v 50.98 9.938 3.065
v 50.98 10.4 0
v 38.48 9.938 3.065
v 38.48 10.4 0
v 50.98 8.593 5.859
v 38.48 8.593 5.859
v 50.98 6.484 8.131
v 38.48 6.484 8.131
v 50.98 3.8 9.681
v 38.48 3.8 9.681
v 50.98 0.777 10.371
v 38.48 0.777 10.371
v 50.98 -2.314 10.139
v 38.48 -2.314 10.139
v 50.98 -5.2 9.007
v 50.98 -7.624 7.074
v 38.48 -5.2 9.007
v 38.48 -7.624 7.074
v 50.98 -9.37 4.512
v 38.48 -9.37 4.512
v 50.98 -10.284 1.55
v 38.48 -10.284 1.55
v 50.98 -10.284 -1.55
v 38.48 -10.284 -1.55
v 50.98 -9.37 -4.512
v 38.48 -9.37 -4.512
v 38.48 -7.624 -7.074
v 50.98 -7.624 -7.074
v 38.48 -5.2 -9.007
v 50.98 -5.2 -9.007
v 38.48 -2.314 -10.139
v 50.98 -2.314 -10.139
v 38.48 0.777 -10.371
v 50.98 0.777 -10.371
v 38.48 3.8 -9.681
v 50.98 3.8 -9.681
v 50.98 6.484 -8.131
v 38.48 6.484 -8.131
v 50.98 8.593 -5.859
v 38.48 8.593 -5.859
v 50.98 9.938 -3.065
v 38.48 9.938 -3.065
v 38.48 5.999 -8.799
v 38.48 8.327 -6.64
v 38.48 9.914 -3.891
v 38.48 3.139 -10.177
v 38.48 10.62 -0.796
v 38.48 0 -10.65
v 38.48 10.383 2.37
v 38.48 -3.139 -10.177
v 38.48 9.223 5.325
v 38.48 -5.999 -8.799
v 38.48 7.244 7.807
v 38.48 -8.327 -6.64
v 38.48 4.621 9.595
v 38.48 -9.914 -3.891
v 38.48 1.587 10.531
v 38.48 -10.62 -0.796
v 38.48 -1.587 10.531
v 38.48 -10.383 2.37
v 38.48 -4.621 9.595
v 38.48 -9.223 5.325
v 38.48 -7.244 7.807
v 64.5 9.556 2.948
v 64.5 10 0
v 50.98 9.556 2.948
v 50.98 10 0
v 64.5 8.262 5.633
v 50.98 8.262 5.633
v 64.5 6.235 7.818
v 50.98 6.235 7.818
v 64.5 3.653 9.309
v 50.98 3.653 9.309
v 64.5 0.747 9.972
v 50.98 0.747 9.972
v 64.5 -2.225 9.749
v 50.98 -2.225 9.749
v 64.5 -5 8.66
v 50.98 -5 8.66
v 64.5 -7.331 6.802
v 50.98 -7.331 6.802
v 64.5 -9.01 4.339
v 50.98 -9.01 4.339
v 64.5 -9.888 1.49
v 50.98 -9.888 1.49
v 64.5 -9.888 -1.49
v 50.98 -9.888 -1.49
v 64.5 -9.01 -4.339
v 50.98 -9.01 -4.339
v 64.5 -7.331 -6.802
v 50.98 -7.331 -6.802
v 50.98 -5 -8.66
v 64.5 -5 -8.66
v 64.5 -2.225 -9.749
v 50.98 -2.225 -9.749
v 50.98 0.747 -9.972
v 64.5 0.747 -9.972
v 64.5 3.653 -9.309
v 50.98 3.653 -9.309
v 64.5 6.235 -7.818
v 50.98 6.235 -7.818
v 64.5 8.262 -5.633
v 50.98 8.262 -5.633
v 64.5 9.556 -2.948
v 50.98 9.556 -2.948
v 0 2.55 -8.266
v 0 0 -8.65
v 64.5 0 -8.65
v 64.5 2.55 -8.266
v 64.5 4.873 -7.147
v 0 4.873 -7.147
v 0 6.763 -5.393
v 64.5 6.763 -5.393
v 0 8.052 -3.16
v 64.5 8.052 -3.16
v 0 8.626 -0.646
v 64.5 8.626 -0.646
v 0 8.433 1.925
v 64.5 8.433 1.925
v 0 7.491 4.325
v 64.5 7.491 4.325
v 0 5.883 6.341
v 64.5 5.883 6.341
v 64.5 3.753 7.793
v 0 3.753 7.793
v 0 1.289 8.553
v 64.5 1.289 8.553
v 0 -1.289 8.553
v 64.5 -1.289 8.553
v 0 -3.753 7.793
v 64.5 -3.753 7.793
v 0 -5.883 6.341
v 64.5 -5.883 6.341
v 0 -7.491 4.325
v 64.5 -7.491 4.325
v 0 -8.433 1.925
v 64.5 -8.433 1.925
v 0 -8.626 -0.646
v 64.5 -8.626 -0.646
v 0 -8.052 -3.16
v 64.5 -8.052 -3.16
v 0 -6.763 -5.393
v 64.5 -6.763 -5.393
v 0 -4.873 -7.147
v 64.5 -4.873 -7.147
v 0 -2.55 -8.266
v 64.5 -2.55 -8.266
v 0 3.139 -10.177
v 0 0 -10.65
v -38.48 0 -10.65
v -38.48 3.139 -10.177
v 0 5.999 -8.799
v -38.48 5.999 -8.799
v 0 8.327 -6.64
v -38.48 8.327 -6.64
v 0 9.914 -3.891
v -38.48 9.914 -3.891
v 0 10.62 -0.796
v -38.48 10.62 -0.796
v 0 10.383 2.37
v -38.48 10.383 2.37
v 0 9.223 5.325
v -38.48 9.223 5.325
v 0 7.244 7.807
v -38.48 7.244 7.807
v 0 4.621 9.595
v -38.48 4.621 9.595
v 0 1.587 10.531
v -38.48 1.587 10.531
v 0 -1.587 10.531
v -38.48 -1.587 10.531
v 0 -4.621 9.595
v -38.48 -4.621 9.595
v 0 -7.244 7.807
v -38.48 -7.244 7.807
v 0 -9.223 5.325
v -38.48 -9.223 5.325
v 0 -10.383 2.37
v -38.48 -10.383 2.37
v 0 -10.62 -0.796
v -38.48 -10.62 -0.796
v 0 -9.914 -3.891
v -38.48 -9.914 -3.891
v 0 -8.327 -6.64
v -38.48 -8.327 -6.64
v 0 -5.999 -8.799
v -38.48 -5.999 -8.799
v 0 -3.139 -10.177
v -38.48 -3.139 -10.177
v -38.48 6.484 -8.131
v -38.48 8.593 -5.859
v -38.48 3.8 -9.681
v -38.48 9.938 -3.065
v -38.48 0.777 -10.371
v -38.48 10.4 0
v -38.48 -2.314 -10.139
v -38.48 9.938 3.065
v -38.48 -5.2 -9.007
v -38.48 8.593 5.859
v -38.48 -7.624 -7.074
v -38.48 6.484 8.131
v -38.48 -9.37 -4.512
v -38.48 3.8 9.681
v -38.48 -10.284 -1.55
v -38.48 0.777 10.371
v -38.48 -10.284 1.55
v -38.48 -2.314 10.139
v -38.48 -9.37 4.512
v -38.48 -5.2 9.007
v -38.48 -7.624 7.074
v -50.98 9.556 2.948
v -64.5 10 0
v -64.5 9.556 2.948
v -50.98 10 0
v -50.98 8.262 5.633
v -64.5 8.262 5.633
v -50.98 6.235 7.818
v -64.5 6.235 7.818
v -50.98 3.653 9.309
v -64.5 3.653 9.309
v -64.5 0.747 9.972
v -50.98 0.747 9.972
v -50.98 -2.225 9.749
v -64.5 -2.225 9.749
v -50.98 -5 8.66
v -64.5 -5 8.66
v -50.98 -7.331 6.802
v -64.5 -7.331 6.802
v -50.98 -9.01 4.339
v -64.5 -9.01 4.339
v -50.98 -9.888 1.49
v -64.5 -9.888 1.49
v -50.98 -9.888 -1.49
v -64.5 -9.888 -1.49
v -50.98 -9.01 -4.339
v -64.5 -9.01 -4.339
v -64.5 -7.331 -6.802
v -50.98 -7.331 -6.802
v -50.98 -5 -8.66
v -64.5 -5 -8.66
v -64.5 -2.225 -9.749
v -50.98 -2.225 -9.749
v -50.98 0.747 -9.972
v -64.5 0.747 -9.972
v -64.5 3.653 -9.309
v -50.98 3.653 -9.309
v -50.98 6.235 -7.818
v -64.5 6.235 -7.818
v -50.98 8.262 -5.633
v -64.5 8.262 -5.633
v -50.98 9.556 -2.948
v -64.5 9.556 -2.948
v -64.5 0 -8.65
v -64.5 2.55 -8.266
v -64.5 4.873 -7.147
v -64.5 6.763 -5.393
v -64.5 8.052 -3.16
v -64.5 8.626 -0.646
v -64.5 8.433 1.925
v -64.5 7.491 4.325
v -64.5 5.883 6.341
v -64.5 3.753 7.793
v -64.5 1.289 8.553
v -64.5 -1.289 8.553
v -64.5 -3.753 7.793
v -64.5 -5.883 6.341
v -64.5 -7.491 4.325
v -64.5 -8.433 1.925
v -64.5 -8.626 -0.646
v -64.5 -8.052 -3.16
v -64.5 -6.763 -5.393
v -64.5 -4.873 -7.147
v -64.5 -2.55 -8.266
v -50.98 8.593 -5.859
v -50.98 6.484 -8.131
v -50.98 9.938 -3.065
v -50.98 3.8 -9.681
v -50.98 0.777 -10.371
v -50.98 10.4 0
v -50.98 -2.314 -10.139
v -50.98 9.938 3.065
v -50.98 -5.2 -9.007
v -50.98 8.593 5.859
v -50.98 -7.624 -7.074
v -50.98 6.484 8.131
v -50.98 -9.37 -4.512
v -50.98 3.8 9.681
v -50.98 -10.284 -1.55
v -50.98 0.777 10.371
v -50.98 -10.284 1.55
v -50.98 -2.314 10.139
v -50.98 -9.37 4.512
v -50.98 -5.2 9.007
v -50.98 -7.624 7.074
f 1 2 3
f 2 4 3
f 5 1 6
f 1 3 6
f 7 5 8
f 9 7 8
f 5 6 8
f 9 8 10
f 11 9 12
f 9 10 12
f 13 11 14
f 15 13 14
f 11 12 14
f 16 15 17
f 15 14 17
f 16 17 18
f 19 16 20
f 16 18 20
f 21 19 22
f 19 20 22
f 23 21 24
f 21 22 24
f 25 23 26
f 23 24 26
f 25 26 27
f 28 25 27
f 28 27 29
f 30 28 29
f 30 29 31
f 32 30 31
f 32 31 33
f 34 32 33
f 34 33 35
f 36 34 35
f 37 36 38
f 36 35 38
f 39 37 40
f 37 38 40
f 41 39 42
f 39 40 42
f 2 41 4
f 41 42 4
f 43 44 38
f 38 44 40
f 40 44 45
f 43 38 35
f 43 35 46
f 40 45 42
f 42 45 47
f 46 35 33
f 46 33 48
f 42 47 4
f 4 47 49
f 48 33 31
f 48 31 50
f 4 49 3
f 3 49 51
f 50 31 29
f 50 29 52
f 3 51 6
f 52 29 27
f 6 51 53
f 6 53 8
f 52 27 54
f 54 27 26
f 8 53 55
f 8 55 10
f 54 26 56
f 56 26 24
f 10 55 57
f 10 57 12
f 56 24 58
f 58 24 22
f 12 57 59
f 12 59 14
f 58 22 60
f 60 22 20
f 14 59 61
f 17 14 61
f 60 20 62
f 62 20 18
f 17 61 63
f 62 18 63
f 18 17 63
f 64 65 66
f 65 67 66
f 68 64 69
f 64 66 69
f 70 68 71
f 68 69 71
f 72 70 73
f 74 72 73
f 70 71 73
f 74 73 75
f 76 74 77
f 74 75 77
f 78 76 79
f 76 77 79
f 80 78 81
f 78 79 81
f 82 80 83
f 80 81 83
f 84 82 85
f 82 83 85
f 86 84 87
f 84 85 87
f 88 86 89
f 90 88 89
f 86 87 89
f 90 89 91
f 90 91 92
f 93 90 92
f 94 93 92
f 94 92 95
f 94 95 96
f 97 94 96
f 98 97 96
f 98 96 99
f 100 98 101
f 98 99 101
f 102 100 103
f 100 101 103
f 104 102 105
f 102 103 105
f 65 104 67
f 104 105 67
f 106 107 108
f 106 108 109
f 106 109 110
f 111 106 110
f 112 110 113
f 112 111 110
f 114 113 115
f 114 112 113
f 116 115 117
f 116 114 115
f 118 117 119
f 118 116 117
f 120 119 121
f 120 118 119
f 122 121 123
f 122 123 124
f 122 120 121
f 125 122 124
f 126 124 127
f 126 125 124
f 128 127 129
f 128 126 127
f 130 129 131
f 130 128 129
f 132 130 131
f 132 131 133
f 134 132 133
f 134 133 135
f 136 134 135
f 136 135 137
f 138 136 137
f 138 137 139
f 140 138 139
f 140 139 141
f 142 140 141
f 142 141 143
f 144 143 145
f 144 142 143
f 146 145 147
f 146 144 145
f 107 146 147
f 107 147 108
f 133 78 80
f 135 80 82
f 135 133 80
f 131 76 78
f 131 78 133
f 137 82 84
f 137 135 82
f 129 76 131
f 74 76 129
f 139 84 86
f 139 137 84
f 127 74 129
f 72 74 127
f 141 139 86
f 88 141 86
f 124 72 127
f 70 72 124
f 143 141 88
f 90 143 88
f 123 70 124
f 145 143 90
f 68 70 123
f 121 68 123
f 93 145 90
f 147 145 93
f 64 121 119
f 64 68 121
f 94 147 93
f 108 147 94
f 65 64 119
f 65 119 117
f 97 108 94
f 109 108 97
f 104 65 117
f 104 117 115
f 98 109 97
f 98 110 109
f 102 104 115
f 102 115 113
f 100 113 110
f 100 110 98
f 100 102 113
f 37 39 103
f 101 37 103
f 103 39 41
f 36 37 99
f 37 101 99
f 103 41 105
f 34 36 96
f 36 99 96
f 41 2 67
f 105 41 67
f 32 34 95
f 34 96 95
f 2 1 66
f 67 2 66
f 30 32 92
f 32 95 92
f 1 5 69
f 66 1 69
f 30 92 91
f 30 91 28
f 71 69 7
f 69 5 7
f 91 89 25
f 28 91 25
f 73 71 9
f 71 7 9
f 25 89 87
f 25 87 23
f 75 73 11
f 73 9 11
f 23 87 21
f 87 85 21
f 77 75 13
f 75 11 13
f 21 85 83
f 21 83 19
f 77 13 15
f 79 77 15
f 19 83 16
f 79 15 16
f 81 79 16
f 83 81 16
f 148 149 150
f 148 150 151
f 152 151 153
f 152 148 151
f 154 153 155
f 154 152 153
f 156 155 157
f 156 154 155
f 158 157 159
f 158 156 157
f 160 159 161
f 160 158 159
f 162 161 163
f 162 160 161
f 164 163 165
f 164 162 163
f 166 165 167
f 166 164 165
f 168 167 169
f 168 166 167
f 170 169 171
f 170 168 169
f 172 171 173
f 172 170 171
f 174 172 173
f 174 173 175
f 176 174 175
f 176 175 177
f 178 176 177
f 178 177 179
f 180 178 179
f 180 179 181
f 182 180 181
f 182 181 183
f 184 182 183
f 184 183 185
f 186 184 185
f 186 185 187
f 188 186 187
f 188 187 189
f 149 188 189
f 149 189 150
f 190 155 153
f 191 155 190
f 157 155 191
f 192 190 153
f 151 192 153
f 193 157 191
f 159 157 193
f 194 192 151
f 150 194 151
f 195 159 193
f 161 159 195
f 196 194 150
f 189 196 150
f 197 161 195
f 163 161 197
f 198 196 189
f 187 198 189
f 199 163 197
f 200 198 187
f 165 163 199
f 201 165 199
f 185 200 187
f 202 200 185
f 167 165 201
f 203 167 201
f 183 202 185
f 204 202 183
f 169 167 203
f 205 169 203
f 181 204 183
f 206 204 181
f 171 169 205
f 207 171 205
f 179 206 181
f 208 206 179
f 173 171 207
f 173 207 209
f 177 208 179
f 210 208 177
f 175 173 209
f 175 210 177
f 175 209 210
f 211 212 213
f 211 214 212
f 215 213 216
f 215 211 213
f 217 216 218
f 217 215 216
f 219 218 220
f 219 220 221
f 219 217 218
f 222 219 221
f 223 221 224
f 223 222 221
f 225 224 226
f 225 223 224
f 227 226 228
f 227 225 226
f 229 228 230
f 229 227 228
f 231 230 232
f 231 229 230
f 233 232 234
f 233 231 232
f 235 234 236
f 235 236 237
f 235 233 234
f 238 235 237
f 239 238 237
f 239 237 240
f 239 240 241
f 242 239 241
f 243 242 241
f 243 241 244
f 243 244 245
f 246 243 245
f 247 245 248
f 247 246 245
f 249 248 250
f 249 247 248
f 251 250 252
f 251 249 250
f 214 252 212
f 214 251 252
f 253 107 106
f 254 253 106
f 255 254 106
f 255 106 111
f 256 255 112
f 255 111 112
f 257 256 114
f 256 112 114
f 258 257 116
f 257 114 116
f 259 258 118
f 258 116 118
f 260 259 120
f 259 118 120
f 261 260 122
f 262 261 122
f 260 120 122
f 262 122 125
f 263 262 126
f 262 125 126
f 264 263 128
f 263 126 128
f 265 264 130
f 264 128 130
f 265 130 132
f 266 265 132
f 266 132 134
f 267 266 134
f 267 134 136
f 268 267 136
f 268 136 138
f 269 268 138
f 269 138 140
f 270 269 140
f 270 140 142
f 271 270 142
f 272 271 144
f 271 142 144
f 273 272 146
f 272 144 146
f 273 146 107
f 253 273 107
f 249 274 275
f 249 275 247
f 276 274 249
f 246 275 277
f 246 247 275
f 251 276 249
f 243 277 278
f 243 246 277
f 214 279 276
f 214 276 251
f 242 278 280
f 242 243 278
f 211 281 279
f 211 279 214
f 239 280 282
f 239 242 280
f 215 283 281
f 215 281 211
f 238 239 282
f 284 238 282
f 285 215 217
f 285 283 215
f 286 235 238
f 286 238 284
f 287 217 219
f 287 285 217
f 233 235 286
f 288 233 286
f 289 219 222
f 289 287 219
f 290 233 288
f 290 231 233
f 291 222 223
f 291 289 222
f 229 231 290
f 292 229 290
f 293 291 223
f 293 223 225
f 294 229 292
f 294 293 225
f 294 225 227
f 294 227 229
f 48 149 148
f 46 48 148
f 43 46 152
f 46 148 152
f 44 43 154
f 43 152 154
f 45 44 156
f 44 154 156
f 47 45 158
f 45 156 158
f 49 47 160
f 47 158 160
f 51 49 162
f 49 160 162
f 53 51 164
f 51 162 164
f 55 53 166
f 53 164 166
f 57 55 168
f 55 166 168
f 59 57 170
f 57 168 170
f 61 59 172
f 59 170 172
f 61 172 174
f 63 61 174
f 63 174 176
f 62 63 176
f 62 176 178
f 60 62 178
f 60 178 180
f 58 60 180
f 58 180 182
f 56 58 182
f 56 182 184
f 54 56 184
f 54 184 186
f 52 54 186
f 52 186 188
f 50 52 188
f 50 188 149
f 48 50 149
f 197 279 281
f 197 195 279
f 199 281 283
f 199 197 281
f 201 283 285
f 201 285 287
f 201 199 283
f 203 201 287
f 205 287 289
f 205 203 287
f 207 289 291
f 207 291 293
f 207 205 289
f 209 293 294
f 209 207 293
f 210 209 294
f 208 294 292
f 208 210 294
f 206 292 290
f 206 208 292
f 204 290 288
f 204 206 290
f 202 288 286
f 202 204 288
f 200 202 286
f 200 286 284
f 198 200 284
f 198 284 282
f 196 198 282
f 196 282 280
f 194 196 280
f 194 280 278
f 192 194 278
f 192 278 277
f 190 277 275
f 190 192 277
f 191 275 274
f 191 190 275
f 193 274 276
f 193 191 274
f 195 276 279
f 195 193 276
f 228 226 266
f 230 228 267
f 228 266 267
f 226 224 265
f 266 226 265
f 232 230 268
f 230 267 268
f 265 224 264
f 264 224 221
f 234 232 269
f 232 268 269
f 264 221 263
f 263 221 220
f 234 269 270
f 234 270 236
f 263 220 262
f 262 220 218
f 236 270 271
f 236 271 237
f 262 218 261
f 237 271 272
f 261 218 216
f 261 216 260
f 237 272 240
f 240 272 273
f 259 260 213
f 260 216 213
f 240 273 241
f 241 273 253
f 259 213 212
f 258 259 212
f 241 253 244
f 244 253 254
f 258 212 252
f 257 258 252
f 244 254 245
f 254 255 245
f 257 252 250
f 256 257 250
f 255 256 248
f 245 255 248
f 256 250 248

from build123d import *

# Parameters (mm, degrees)
SKETCH_1_R      = 10.65
SKETCH_1_R_2    = 8.65
EXTRUDE_1_DEPTH = 64.5


with BuildPart() as part:
    # Эскиз1 → Бобышка-Вытянуть1 (new body)
    with BuildSketch(Plane(origin=(0, 0, 0), x_dir=(0, 0, -1), z_dir=(1, 0, 0))):
        Circle(SKETCH_1_R)
        Circle(SKETCH_1_R_2, mode=Mode.SUBTRACT)
    extrude(amount=-EXTRUDE_1_DEPTH)

    # Эскиз2 → Вырез-Повернуть1 (revolve, cut)
    with BuildSketch(Plane.XY):
        Polygon((-38.480196097, 10.65), (-64.5, 10.65), (-64.5, 10), (-50.980196097, 10), (-50.980196097, 10.4), (-38.480196097, 10.4), align=None)
    revolve(axis=Axis((-1000, 0, 0), (1, 0, 0)), mode=Mode.SUBTRACT)

    # Зеркальное отражение1: part across plane


with BuildPart() as part_1:
    add(part.part)
    add(part.part.mirror(Plane(origin=(0, 0, 0), x_dir=(0, 0, 1), z_dir=(1, 0, 0))))


solid = part_1.part
